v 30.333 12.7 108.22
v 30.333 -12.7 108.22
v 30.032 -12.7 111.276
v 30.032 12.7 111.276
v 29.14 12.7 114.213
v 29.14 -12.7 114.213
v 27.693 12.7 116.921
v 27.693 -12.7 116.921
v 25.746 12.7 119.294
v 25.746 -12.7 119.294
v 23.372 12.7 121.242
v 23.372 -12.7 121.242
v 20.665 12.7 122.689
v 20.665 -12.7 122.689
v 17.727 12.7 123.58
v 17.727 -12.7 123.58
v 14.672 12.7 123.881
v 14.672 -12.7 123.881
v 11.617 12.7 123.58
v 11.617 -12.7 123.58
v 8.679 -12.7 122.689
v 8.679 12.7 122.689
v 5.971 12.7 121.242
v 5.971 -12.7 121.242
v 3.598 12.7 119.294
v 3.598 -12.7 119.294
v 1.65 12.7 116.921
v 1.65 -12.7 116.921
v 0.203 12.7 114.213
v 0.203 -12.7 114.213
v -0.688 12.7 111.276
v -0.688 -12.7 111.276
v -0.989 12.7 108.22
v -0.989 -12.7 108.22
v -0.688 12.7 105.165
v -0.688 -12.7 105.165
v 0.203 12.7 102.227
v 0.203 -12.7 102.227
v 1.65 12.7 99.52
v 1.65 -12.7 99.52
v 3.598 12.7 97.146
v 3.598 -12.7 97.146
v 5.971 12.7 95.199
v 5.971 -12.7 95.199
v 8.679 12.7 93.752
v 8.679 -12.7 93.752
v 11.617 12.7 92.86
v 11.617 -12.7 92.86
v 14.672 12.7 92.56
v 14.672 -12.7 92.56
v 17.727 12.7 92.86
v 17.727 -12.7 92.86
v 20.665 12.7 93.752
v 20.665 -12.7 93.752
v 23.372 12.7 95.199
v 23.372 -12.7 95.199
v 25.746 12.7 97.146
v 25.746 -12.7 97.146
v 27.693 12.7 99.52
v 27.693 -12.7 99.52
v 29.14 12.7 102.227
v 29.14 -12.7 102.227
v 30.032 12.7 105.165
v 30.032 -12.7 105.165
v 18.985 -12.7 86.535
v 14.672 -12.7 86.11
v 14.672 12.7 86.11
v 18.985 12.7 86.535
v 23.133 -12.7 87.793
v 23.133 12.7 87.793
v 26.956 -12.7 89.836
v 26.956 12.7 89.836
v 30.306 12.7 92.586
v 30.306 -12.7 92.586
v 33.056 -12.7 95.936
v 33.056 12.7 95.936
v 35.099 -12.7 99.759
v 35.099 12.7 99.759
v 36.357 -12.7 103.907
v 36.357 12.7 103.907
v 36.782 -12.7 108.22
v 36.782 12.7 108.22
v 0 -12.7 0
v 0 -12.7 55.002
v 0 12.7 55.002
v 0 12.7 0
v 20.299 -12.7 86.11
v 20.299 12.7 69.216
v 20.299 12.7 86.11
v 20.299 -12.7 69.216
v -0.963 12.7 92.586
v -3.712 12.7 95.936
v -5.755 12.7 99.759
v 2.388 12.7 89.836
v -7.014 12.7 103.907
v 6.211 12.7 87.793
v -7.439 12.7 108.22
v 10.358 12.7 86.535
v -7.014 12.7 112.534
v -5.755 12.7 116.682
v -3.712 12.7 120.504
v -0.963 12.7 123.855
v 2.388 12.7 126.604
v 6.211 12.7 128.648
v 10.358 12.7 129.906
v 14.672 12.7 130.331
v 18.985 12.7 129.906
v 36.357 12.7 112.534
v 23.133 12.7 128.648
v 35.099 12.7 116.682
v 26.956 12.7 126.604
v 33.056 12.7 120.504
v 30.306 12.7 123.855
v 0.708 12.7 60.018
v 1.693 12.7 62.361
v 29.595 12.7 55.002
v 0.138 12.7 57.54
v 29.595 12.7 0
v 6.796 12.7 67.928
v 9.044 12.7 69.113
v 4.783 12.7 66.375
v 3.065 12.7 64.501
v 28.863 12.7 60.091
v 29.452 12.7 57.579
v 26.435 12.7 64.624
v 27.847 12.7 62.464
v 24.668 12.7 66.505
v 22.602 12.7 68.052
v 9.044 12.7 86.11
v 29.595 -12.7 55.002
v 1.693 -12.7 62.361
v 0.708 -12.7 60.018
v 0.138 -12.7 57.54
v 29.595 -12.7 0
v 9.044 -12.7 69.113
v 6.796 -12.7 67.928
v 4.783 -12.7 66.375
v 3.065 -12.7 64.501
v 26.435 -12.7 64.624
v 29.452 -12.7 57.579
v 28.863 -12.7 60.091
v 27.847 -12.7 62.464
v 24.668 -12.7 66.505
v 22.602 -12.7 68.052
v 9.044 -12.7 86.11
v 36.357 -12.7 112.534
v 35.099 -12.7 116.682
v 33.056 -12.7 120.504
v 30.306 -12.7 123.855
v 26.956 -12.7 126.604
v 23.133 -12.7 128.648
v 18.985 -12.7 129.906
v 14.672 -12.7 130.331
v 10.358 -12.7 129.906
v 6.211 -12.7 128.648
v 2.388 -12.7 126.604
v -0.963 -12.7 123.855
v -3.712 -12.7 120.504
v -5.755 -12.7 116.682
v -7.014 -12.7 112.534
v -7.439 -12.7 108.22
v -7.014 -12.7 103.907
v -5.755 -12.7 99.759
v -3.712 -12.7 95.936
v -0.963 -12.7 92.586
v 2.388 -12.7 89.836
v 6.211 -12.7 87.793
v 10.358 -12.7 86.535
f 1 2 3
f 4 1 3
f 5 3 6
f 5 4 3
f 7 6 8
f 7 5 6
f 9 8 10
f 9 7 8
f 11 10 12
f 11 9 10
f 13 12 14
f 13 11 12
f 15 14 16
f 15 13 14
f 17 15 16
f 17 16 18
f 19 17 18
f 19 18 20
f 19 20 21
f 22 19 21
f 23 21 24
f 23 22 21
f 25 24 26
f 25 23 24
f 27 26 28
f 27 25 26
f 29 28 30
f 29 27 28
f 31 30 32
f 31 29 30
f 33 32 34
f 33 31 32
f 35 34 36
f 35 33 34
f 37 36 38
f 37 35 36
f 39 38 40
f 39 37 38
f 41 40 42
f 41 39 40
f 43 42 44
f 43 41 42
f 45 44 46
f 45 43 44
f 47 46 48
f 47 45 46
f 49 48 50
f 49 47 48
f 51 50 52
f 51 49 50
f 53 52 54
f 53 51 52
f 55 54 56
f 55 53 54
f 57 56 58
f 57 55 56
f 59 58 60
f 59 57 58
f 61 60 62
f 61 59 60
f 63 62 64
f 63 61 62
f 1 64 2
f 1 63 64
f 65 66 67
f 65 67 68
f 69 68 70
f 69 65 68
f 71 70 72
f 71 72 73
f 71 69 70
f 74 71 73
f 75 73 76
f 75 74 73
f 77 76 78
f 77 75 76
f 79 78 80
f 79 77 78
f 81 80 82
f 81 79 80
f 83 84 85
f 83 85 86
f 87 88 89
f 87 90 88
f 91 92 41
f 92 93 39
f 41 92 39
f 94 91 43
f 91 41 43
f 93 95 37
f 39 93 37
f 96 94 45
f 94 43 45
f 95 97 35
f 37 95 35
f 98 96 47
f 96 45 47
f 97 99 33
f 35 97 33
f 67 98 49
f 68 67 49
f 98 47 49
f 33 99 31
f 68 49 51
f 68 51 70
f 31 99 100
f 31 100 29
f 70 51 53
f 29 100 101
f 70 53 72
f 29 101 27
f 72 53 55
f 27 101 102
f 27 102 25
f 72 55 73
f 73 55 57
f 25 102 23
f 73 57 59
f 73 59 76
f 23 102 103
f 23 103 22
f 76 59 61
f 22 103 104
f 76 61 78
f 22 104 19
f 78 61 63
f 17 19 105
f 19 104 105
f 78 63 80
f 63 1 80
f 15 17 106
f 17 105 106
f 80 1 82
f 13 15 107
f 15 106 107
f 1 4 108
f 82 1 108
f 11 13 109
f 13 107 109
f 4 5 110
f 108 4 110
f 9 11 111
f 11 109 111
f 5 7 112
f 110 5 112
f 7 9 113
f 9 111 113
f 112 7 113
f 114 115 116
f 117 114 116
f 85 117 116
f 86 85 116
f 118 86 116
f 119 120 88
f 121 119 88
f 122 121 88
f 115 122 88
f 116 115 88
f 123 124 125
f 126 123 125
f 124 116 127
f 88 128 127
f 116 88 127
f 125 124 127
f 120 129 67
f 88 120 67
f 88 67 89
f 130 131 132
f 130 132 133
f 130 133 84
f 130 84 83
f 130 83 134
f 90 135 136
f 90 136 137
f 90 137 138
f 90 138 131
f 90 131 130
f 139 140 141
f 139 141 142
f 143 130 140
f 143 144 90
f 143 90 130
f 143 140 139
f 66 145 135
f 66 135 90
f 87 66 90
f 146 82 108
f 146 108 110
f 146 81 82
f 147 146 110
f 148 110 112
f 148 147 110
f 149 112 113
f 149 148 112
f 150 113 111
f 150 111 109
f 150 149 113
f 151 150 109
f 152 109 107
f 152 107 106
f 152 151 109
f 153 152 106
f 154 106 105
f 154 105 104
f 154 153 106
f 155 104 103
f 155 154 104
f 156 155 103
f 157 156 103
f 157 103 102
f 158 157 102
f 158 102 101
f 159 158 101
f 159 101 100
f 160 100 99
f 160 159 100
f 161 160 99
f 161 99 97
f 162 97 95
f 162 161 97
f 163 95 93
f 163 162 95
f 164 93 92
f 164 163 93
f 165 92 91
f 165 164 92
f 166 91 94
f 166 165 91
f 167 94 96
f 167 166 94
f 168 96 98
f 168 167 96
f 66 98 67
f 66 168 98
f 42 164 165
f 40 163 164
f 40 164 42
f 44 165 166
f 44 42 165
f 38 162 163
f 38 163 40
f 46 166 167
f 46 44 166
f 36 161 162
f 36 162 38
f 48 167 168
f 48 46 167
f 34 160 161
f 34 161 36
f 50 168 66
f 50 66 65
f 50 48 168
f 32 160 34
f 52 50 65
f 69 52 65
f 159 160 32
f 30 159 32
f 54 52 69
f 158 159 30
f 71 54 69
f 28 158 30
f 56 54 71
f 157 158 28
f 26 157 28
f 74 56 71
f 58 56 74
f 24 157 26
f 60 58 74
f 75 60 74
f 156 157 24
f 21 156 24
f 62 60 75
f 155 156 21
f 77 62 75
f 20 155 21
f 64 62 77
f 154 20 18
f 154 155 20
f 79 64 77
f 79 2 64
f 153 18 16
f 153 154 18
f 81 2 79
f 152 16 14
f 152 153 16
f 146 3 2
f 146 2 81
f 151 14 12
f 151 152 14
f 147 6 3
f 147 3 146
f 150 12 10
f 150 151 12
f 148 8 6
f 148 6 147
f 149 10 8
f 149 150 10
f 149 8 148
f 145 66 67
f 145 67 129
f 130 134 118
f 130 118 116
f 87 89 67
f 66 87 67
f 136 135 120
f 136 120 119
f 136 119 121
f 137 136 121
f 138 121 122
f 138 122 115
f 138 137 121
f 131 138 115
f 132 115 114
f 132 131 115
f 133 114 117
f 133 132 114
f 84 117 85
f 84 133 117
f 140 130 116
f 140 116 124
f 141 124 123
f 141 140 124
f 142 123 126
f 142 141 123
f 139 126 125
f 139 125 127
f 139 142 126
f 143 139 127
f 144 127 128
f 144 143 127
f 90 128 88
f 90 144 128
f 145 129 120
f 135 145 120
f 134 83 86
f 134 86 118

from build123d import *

# Parameters (mm, degrees)
F1_DEPTH = 12.7
F0_R     = 15.660762
F2_DEPTH = 12.7


with BuildPart() as f1:
    # F0 (on Front) → F1 (new body, symmetric)
    with BuildSketch(Plane.XZ):
        with BuildLine():
            Line((9.044379, 86.110003), (9.044379, 69.112956))
            ThreePointArc((9.044379, 69.112956), (14.661603, 70.275832), (20.299211, 69.216185))
            Line((20.299211, 69.216185), (20.299211, 86.110003))
            Line((20.299211, 86.110003), (14.671795, 86.110003))
            Line((14.671795, 86.110003), (9.044379, 86.110003))
        make_face()
        with BuildLine():
            Line((0, 55.002023), (0, 0))
            Line((0, 0), (29.594775, 0))
            Line((29.594775, 0), (29.594775, 55.002023))
            ThreePointArc((29.594775, 55.002023), (27.187912, 63.574587), (20.299211, 69.216185))
            ThreePointArc((20.299211, 69.216185), (14.661603, 70.275832), (9.044379, 69.112956))
            ThreePointArc((9.044379, 69.112956), (2.333067, 63.460604), (0, 55.002023))
        make_face()
    extrude(amount=F1_DEPTH, both=True)

    # F0 (on Front) → F2 (join, symmetric)
    with BuildSketch(Plane.XZ):
        with BuildLine():
            Line((0, 55.002023), (0, 0))
            Line((0, 0), (29.594775, 0))
            Line((29.594775, 0), (29.594775, 55.002023))
            ThreePointArc((29.594775, 55.002023), (27.187912, 63.574587), (20.299211, 69.216185))
            ThreePointArc((20.299211, 69.216185), (14.661603, 70.275832), (9.044379, 69.112956))
            ThreePointArc((9.044379, 69.112956), (2.333067, 63.460604), (0, 55.002023))
        make_face()
        with BuildLine():
            ThreePointArc((36.782101, 108.220309), (-0.962552, 123.854656), (14.671795, 86.110003))
            ThreePointArc((14.671795, 86.110003), (30.306142, 92.585962), (36.782101, 108.220309))
        make_face()
        with Locations((14.671795, 108.220309)):
            Circle(F0_R, mode=Mode.SUBTRACT)
        with BuildLine():
            Line((9.044379, 86.110003), (9.044379, 69.112956))
            ThreePointArc((9.044379, 69.112956), (14.661603, 70.275832), (20.299211, 69.216185))
            Line((20.299211, 69.216185), (20.299211, 86.110003))
            Line((20.299211, 86.110003), (14.671795, 86.110003))
            Line((14.671795, 86.110003), (9.044379, 86.110003))
        make_face()
    extrude(amount=F2_DEPTH, both=True)


solid = f1.part
